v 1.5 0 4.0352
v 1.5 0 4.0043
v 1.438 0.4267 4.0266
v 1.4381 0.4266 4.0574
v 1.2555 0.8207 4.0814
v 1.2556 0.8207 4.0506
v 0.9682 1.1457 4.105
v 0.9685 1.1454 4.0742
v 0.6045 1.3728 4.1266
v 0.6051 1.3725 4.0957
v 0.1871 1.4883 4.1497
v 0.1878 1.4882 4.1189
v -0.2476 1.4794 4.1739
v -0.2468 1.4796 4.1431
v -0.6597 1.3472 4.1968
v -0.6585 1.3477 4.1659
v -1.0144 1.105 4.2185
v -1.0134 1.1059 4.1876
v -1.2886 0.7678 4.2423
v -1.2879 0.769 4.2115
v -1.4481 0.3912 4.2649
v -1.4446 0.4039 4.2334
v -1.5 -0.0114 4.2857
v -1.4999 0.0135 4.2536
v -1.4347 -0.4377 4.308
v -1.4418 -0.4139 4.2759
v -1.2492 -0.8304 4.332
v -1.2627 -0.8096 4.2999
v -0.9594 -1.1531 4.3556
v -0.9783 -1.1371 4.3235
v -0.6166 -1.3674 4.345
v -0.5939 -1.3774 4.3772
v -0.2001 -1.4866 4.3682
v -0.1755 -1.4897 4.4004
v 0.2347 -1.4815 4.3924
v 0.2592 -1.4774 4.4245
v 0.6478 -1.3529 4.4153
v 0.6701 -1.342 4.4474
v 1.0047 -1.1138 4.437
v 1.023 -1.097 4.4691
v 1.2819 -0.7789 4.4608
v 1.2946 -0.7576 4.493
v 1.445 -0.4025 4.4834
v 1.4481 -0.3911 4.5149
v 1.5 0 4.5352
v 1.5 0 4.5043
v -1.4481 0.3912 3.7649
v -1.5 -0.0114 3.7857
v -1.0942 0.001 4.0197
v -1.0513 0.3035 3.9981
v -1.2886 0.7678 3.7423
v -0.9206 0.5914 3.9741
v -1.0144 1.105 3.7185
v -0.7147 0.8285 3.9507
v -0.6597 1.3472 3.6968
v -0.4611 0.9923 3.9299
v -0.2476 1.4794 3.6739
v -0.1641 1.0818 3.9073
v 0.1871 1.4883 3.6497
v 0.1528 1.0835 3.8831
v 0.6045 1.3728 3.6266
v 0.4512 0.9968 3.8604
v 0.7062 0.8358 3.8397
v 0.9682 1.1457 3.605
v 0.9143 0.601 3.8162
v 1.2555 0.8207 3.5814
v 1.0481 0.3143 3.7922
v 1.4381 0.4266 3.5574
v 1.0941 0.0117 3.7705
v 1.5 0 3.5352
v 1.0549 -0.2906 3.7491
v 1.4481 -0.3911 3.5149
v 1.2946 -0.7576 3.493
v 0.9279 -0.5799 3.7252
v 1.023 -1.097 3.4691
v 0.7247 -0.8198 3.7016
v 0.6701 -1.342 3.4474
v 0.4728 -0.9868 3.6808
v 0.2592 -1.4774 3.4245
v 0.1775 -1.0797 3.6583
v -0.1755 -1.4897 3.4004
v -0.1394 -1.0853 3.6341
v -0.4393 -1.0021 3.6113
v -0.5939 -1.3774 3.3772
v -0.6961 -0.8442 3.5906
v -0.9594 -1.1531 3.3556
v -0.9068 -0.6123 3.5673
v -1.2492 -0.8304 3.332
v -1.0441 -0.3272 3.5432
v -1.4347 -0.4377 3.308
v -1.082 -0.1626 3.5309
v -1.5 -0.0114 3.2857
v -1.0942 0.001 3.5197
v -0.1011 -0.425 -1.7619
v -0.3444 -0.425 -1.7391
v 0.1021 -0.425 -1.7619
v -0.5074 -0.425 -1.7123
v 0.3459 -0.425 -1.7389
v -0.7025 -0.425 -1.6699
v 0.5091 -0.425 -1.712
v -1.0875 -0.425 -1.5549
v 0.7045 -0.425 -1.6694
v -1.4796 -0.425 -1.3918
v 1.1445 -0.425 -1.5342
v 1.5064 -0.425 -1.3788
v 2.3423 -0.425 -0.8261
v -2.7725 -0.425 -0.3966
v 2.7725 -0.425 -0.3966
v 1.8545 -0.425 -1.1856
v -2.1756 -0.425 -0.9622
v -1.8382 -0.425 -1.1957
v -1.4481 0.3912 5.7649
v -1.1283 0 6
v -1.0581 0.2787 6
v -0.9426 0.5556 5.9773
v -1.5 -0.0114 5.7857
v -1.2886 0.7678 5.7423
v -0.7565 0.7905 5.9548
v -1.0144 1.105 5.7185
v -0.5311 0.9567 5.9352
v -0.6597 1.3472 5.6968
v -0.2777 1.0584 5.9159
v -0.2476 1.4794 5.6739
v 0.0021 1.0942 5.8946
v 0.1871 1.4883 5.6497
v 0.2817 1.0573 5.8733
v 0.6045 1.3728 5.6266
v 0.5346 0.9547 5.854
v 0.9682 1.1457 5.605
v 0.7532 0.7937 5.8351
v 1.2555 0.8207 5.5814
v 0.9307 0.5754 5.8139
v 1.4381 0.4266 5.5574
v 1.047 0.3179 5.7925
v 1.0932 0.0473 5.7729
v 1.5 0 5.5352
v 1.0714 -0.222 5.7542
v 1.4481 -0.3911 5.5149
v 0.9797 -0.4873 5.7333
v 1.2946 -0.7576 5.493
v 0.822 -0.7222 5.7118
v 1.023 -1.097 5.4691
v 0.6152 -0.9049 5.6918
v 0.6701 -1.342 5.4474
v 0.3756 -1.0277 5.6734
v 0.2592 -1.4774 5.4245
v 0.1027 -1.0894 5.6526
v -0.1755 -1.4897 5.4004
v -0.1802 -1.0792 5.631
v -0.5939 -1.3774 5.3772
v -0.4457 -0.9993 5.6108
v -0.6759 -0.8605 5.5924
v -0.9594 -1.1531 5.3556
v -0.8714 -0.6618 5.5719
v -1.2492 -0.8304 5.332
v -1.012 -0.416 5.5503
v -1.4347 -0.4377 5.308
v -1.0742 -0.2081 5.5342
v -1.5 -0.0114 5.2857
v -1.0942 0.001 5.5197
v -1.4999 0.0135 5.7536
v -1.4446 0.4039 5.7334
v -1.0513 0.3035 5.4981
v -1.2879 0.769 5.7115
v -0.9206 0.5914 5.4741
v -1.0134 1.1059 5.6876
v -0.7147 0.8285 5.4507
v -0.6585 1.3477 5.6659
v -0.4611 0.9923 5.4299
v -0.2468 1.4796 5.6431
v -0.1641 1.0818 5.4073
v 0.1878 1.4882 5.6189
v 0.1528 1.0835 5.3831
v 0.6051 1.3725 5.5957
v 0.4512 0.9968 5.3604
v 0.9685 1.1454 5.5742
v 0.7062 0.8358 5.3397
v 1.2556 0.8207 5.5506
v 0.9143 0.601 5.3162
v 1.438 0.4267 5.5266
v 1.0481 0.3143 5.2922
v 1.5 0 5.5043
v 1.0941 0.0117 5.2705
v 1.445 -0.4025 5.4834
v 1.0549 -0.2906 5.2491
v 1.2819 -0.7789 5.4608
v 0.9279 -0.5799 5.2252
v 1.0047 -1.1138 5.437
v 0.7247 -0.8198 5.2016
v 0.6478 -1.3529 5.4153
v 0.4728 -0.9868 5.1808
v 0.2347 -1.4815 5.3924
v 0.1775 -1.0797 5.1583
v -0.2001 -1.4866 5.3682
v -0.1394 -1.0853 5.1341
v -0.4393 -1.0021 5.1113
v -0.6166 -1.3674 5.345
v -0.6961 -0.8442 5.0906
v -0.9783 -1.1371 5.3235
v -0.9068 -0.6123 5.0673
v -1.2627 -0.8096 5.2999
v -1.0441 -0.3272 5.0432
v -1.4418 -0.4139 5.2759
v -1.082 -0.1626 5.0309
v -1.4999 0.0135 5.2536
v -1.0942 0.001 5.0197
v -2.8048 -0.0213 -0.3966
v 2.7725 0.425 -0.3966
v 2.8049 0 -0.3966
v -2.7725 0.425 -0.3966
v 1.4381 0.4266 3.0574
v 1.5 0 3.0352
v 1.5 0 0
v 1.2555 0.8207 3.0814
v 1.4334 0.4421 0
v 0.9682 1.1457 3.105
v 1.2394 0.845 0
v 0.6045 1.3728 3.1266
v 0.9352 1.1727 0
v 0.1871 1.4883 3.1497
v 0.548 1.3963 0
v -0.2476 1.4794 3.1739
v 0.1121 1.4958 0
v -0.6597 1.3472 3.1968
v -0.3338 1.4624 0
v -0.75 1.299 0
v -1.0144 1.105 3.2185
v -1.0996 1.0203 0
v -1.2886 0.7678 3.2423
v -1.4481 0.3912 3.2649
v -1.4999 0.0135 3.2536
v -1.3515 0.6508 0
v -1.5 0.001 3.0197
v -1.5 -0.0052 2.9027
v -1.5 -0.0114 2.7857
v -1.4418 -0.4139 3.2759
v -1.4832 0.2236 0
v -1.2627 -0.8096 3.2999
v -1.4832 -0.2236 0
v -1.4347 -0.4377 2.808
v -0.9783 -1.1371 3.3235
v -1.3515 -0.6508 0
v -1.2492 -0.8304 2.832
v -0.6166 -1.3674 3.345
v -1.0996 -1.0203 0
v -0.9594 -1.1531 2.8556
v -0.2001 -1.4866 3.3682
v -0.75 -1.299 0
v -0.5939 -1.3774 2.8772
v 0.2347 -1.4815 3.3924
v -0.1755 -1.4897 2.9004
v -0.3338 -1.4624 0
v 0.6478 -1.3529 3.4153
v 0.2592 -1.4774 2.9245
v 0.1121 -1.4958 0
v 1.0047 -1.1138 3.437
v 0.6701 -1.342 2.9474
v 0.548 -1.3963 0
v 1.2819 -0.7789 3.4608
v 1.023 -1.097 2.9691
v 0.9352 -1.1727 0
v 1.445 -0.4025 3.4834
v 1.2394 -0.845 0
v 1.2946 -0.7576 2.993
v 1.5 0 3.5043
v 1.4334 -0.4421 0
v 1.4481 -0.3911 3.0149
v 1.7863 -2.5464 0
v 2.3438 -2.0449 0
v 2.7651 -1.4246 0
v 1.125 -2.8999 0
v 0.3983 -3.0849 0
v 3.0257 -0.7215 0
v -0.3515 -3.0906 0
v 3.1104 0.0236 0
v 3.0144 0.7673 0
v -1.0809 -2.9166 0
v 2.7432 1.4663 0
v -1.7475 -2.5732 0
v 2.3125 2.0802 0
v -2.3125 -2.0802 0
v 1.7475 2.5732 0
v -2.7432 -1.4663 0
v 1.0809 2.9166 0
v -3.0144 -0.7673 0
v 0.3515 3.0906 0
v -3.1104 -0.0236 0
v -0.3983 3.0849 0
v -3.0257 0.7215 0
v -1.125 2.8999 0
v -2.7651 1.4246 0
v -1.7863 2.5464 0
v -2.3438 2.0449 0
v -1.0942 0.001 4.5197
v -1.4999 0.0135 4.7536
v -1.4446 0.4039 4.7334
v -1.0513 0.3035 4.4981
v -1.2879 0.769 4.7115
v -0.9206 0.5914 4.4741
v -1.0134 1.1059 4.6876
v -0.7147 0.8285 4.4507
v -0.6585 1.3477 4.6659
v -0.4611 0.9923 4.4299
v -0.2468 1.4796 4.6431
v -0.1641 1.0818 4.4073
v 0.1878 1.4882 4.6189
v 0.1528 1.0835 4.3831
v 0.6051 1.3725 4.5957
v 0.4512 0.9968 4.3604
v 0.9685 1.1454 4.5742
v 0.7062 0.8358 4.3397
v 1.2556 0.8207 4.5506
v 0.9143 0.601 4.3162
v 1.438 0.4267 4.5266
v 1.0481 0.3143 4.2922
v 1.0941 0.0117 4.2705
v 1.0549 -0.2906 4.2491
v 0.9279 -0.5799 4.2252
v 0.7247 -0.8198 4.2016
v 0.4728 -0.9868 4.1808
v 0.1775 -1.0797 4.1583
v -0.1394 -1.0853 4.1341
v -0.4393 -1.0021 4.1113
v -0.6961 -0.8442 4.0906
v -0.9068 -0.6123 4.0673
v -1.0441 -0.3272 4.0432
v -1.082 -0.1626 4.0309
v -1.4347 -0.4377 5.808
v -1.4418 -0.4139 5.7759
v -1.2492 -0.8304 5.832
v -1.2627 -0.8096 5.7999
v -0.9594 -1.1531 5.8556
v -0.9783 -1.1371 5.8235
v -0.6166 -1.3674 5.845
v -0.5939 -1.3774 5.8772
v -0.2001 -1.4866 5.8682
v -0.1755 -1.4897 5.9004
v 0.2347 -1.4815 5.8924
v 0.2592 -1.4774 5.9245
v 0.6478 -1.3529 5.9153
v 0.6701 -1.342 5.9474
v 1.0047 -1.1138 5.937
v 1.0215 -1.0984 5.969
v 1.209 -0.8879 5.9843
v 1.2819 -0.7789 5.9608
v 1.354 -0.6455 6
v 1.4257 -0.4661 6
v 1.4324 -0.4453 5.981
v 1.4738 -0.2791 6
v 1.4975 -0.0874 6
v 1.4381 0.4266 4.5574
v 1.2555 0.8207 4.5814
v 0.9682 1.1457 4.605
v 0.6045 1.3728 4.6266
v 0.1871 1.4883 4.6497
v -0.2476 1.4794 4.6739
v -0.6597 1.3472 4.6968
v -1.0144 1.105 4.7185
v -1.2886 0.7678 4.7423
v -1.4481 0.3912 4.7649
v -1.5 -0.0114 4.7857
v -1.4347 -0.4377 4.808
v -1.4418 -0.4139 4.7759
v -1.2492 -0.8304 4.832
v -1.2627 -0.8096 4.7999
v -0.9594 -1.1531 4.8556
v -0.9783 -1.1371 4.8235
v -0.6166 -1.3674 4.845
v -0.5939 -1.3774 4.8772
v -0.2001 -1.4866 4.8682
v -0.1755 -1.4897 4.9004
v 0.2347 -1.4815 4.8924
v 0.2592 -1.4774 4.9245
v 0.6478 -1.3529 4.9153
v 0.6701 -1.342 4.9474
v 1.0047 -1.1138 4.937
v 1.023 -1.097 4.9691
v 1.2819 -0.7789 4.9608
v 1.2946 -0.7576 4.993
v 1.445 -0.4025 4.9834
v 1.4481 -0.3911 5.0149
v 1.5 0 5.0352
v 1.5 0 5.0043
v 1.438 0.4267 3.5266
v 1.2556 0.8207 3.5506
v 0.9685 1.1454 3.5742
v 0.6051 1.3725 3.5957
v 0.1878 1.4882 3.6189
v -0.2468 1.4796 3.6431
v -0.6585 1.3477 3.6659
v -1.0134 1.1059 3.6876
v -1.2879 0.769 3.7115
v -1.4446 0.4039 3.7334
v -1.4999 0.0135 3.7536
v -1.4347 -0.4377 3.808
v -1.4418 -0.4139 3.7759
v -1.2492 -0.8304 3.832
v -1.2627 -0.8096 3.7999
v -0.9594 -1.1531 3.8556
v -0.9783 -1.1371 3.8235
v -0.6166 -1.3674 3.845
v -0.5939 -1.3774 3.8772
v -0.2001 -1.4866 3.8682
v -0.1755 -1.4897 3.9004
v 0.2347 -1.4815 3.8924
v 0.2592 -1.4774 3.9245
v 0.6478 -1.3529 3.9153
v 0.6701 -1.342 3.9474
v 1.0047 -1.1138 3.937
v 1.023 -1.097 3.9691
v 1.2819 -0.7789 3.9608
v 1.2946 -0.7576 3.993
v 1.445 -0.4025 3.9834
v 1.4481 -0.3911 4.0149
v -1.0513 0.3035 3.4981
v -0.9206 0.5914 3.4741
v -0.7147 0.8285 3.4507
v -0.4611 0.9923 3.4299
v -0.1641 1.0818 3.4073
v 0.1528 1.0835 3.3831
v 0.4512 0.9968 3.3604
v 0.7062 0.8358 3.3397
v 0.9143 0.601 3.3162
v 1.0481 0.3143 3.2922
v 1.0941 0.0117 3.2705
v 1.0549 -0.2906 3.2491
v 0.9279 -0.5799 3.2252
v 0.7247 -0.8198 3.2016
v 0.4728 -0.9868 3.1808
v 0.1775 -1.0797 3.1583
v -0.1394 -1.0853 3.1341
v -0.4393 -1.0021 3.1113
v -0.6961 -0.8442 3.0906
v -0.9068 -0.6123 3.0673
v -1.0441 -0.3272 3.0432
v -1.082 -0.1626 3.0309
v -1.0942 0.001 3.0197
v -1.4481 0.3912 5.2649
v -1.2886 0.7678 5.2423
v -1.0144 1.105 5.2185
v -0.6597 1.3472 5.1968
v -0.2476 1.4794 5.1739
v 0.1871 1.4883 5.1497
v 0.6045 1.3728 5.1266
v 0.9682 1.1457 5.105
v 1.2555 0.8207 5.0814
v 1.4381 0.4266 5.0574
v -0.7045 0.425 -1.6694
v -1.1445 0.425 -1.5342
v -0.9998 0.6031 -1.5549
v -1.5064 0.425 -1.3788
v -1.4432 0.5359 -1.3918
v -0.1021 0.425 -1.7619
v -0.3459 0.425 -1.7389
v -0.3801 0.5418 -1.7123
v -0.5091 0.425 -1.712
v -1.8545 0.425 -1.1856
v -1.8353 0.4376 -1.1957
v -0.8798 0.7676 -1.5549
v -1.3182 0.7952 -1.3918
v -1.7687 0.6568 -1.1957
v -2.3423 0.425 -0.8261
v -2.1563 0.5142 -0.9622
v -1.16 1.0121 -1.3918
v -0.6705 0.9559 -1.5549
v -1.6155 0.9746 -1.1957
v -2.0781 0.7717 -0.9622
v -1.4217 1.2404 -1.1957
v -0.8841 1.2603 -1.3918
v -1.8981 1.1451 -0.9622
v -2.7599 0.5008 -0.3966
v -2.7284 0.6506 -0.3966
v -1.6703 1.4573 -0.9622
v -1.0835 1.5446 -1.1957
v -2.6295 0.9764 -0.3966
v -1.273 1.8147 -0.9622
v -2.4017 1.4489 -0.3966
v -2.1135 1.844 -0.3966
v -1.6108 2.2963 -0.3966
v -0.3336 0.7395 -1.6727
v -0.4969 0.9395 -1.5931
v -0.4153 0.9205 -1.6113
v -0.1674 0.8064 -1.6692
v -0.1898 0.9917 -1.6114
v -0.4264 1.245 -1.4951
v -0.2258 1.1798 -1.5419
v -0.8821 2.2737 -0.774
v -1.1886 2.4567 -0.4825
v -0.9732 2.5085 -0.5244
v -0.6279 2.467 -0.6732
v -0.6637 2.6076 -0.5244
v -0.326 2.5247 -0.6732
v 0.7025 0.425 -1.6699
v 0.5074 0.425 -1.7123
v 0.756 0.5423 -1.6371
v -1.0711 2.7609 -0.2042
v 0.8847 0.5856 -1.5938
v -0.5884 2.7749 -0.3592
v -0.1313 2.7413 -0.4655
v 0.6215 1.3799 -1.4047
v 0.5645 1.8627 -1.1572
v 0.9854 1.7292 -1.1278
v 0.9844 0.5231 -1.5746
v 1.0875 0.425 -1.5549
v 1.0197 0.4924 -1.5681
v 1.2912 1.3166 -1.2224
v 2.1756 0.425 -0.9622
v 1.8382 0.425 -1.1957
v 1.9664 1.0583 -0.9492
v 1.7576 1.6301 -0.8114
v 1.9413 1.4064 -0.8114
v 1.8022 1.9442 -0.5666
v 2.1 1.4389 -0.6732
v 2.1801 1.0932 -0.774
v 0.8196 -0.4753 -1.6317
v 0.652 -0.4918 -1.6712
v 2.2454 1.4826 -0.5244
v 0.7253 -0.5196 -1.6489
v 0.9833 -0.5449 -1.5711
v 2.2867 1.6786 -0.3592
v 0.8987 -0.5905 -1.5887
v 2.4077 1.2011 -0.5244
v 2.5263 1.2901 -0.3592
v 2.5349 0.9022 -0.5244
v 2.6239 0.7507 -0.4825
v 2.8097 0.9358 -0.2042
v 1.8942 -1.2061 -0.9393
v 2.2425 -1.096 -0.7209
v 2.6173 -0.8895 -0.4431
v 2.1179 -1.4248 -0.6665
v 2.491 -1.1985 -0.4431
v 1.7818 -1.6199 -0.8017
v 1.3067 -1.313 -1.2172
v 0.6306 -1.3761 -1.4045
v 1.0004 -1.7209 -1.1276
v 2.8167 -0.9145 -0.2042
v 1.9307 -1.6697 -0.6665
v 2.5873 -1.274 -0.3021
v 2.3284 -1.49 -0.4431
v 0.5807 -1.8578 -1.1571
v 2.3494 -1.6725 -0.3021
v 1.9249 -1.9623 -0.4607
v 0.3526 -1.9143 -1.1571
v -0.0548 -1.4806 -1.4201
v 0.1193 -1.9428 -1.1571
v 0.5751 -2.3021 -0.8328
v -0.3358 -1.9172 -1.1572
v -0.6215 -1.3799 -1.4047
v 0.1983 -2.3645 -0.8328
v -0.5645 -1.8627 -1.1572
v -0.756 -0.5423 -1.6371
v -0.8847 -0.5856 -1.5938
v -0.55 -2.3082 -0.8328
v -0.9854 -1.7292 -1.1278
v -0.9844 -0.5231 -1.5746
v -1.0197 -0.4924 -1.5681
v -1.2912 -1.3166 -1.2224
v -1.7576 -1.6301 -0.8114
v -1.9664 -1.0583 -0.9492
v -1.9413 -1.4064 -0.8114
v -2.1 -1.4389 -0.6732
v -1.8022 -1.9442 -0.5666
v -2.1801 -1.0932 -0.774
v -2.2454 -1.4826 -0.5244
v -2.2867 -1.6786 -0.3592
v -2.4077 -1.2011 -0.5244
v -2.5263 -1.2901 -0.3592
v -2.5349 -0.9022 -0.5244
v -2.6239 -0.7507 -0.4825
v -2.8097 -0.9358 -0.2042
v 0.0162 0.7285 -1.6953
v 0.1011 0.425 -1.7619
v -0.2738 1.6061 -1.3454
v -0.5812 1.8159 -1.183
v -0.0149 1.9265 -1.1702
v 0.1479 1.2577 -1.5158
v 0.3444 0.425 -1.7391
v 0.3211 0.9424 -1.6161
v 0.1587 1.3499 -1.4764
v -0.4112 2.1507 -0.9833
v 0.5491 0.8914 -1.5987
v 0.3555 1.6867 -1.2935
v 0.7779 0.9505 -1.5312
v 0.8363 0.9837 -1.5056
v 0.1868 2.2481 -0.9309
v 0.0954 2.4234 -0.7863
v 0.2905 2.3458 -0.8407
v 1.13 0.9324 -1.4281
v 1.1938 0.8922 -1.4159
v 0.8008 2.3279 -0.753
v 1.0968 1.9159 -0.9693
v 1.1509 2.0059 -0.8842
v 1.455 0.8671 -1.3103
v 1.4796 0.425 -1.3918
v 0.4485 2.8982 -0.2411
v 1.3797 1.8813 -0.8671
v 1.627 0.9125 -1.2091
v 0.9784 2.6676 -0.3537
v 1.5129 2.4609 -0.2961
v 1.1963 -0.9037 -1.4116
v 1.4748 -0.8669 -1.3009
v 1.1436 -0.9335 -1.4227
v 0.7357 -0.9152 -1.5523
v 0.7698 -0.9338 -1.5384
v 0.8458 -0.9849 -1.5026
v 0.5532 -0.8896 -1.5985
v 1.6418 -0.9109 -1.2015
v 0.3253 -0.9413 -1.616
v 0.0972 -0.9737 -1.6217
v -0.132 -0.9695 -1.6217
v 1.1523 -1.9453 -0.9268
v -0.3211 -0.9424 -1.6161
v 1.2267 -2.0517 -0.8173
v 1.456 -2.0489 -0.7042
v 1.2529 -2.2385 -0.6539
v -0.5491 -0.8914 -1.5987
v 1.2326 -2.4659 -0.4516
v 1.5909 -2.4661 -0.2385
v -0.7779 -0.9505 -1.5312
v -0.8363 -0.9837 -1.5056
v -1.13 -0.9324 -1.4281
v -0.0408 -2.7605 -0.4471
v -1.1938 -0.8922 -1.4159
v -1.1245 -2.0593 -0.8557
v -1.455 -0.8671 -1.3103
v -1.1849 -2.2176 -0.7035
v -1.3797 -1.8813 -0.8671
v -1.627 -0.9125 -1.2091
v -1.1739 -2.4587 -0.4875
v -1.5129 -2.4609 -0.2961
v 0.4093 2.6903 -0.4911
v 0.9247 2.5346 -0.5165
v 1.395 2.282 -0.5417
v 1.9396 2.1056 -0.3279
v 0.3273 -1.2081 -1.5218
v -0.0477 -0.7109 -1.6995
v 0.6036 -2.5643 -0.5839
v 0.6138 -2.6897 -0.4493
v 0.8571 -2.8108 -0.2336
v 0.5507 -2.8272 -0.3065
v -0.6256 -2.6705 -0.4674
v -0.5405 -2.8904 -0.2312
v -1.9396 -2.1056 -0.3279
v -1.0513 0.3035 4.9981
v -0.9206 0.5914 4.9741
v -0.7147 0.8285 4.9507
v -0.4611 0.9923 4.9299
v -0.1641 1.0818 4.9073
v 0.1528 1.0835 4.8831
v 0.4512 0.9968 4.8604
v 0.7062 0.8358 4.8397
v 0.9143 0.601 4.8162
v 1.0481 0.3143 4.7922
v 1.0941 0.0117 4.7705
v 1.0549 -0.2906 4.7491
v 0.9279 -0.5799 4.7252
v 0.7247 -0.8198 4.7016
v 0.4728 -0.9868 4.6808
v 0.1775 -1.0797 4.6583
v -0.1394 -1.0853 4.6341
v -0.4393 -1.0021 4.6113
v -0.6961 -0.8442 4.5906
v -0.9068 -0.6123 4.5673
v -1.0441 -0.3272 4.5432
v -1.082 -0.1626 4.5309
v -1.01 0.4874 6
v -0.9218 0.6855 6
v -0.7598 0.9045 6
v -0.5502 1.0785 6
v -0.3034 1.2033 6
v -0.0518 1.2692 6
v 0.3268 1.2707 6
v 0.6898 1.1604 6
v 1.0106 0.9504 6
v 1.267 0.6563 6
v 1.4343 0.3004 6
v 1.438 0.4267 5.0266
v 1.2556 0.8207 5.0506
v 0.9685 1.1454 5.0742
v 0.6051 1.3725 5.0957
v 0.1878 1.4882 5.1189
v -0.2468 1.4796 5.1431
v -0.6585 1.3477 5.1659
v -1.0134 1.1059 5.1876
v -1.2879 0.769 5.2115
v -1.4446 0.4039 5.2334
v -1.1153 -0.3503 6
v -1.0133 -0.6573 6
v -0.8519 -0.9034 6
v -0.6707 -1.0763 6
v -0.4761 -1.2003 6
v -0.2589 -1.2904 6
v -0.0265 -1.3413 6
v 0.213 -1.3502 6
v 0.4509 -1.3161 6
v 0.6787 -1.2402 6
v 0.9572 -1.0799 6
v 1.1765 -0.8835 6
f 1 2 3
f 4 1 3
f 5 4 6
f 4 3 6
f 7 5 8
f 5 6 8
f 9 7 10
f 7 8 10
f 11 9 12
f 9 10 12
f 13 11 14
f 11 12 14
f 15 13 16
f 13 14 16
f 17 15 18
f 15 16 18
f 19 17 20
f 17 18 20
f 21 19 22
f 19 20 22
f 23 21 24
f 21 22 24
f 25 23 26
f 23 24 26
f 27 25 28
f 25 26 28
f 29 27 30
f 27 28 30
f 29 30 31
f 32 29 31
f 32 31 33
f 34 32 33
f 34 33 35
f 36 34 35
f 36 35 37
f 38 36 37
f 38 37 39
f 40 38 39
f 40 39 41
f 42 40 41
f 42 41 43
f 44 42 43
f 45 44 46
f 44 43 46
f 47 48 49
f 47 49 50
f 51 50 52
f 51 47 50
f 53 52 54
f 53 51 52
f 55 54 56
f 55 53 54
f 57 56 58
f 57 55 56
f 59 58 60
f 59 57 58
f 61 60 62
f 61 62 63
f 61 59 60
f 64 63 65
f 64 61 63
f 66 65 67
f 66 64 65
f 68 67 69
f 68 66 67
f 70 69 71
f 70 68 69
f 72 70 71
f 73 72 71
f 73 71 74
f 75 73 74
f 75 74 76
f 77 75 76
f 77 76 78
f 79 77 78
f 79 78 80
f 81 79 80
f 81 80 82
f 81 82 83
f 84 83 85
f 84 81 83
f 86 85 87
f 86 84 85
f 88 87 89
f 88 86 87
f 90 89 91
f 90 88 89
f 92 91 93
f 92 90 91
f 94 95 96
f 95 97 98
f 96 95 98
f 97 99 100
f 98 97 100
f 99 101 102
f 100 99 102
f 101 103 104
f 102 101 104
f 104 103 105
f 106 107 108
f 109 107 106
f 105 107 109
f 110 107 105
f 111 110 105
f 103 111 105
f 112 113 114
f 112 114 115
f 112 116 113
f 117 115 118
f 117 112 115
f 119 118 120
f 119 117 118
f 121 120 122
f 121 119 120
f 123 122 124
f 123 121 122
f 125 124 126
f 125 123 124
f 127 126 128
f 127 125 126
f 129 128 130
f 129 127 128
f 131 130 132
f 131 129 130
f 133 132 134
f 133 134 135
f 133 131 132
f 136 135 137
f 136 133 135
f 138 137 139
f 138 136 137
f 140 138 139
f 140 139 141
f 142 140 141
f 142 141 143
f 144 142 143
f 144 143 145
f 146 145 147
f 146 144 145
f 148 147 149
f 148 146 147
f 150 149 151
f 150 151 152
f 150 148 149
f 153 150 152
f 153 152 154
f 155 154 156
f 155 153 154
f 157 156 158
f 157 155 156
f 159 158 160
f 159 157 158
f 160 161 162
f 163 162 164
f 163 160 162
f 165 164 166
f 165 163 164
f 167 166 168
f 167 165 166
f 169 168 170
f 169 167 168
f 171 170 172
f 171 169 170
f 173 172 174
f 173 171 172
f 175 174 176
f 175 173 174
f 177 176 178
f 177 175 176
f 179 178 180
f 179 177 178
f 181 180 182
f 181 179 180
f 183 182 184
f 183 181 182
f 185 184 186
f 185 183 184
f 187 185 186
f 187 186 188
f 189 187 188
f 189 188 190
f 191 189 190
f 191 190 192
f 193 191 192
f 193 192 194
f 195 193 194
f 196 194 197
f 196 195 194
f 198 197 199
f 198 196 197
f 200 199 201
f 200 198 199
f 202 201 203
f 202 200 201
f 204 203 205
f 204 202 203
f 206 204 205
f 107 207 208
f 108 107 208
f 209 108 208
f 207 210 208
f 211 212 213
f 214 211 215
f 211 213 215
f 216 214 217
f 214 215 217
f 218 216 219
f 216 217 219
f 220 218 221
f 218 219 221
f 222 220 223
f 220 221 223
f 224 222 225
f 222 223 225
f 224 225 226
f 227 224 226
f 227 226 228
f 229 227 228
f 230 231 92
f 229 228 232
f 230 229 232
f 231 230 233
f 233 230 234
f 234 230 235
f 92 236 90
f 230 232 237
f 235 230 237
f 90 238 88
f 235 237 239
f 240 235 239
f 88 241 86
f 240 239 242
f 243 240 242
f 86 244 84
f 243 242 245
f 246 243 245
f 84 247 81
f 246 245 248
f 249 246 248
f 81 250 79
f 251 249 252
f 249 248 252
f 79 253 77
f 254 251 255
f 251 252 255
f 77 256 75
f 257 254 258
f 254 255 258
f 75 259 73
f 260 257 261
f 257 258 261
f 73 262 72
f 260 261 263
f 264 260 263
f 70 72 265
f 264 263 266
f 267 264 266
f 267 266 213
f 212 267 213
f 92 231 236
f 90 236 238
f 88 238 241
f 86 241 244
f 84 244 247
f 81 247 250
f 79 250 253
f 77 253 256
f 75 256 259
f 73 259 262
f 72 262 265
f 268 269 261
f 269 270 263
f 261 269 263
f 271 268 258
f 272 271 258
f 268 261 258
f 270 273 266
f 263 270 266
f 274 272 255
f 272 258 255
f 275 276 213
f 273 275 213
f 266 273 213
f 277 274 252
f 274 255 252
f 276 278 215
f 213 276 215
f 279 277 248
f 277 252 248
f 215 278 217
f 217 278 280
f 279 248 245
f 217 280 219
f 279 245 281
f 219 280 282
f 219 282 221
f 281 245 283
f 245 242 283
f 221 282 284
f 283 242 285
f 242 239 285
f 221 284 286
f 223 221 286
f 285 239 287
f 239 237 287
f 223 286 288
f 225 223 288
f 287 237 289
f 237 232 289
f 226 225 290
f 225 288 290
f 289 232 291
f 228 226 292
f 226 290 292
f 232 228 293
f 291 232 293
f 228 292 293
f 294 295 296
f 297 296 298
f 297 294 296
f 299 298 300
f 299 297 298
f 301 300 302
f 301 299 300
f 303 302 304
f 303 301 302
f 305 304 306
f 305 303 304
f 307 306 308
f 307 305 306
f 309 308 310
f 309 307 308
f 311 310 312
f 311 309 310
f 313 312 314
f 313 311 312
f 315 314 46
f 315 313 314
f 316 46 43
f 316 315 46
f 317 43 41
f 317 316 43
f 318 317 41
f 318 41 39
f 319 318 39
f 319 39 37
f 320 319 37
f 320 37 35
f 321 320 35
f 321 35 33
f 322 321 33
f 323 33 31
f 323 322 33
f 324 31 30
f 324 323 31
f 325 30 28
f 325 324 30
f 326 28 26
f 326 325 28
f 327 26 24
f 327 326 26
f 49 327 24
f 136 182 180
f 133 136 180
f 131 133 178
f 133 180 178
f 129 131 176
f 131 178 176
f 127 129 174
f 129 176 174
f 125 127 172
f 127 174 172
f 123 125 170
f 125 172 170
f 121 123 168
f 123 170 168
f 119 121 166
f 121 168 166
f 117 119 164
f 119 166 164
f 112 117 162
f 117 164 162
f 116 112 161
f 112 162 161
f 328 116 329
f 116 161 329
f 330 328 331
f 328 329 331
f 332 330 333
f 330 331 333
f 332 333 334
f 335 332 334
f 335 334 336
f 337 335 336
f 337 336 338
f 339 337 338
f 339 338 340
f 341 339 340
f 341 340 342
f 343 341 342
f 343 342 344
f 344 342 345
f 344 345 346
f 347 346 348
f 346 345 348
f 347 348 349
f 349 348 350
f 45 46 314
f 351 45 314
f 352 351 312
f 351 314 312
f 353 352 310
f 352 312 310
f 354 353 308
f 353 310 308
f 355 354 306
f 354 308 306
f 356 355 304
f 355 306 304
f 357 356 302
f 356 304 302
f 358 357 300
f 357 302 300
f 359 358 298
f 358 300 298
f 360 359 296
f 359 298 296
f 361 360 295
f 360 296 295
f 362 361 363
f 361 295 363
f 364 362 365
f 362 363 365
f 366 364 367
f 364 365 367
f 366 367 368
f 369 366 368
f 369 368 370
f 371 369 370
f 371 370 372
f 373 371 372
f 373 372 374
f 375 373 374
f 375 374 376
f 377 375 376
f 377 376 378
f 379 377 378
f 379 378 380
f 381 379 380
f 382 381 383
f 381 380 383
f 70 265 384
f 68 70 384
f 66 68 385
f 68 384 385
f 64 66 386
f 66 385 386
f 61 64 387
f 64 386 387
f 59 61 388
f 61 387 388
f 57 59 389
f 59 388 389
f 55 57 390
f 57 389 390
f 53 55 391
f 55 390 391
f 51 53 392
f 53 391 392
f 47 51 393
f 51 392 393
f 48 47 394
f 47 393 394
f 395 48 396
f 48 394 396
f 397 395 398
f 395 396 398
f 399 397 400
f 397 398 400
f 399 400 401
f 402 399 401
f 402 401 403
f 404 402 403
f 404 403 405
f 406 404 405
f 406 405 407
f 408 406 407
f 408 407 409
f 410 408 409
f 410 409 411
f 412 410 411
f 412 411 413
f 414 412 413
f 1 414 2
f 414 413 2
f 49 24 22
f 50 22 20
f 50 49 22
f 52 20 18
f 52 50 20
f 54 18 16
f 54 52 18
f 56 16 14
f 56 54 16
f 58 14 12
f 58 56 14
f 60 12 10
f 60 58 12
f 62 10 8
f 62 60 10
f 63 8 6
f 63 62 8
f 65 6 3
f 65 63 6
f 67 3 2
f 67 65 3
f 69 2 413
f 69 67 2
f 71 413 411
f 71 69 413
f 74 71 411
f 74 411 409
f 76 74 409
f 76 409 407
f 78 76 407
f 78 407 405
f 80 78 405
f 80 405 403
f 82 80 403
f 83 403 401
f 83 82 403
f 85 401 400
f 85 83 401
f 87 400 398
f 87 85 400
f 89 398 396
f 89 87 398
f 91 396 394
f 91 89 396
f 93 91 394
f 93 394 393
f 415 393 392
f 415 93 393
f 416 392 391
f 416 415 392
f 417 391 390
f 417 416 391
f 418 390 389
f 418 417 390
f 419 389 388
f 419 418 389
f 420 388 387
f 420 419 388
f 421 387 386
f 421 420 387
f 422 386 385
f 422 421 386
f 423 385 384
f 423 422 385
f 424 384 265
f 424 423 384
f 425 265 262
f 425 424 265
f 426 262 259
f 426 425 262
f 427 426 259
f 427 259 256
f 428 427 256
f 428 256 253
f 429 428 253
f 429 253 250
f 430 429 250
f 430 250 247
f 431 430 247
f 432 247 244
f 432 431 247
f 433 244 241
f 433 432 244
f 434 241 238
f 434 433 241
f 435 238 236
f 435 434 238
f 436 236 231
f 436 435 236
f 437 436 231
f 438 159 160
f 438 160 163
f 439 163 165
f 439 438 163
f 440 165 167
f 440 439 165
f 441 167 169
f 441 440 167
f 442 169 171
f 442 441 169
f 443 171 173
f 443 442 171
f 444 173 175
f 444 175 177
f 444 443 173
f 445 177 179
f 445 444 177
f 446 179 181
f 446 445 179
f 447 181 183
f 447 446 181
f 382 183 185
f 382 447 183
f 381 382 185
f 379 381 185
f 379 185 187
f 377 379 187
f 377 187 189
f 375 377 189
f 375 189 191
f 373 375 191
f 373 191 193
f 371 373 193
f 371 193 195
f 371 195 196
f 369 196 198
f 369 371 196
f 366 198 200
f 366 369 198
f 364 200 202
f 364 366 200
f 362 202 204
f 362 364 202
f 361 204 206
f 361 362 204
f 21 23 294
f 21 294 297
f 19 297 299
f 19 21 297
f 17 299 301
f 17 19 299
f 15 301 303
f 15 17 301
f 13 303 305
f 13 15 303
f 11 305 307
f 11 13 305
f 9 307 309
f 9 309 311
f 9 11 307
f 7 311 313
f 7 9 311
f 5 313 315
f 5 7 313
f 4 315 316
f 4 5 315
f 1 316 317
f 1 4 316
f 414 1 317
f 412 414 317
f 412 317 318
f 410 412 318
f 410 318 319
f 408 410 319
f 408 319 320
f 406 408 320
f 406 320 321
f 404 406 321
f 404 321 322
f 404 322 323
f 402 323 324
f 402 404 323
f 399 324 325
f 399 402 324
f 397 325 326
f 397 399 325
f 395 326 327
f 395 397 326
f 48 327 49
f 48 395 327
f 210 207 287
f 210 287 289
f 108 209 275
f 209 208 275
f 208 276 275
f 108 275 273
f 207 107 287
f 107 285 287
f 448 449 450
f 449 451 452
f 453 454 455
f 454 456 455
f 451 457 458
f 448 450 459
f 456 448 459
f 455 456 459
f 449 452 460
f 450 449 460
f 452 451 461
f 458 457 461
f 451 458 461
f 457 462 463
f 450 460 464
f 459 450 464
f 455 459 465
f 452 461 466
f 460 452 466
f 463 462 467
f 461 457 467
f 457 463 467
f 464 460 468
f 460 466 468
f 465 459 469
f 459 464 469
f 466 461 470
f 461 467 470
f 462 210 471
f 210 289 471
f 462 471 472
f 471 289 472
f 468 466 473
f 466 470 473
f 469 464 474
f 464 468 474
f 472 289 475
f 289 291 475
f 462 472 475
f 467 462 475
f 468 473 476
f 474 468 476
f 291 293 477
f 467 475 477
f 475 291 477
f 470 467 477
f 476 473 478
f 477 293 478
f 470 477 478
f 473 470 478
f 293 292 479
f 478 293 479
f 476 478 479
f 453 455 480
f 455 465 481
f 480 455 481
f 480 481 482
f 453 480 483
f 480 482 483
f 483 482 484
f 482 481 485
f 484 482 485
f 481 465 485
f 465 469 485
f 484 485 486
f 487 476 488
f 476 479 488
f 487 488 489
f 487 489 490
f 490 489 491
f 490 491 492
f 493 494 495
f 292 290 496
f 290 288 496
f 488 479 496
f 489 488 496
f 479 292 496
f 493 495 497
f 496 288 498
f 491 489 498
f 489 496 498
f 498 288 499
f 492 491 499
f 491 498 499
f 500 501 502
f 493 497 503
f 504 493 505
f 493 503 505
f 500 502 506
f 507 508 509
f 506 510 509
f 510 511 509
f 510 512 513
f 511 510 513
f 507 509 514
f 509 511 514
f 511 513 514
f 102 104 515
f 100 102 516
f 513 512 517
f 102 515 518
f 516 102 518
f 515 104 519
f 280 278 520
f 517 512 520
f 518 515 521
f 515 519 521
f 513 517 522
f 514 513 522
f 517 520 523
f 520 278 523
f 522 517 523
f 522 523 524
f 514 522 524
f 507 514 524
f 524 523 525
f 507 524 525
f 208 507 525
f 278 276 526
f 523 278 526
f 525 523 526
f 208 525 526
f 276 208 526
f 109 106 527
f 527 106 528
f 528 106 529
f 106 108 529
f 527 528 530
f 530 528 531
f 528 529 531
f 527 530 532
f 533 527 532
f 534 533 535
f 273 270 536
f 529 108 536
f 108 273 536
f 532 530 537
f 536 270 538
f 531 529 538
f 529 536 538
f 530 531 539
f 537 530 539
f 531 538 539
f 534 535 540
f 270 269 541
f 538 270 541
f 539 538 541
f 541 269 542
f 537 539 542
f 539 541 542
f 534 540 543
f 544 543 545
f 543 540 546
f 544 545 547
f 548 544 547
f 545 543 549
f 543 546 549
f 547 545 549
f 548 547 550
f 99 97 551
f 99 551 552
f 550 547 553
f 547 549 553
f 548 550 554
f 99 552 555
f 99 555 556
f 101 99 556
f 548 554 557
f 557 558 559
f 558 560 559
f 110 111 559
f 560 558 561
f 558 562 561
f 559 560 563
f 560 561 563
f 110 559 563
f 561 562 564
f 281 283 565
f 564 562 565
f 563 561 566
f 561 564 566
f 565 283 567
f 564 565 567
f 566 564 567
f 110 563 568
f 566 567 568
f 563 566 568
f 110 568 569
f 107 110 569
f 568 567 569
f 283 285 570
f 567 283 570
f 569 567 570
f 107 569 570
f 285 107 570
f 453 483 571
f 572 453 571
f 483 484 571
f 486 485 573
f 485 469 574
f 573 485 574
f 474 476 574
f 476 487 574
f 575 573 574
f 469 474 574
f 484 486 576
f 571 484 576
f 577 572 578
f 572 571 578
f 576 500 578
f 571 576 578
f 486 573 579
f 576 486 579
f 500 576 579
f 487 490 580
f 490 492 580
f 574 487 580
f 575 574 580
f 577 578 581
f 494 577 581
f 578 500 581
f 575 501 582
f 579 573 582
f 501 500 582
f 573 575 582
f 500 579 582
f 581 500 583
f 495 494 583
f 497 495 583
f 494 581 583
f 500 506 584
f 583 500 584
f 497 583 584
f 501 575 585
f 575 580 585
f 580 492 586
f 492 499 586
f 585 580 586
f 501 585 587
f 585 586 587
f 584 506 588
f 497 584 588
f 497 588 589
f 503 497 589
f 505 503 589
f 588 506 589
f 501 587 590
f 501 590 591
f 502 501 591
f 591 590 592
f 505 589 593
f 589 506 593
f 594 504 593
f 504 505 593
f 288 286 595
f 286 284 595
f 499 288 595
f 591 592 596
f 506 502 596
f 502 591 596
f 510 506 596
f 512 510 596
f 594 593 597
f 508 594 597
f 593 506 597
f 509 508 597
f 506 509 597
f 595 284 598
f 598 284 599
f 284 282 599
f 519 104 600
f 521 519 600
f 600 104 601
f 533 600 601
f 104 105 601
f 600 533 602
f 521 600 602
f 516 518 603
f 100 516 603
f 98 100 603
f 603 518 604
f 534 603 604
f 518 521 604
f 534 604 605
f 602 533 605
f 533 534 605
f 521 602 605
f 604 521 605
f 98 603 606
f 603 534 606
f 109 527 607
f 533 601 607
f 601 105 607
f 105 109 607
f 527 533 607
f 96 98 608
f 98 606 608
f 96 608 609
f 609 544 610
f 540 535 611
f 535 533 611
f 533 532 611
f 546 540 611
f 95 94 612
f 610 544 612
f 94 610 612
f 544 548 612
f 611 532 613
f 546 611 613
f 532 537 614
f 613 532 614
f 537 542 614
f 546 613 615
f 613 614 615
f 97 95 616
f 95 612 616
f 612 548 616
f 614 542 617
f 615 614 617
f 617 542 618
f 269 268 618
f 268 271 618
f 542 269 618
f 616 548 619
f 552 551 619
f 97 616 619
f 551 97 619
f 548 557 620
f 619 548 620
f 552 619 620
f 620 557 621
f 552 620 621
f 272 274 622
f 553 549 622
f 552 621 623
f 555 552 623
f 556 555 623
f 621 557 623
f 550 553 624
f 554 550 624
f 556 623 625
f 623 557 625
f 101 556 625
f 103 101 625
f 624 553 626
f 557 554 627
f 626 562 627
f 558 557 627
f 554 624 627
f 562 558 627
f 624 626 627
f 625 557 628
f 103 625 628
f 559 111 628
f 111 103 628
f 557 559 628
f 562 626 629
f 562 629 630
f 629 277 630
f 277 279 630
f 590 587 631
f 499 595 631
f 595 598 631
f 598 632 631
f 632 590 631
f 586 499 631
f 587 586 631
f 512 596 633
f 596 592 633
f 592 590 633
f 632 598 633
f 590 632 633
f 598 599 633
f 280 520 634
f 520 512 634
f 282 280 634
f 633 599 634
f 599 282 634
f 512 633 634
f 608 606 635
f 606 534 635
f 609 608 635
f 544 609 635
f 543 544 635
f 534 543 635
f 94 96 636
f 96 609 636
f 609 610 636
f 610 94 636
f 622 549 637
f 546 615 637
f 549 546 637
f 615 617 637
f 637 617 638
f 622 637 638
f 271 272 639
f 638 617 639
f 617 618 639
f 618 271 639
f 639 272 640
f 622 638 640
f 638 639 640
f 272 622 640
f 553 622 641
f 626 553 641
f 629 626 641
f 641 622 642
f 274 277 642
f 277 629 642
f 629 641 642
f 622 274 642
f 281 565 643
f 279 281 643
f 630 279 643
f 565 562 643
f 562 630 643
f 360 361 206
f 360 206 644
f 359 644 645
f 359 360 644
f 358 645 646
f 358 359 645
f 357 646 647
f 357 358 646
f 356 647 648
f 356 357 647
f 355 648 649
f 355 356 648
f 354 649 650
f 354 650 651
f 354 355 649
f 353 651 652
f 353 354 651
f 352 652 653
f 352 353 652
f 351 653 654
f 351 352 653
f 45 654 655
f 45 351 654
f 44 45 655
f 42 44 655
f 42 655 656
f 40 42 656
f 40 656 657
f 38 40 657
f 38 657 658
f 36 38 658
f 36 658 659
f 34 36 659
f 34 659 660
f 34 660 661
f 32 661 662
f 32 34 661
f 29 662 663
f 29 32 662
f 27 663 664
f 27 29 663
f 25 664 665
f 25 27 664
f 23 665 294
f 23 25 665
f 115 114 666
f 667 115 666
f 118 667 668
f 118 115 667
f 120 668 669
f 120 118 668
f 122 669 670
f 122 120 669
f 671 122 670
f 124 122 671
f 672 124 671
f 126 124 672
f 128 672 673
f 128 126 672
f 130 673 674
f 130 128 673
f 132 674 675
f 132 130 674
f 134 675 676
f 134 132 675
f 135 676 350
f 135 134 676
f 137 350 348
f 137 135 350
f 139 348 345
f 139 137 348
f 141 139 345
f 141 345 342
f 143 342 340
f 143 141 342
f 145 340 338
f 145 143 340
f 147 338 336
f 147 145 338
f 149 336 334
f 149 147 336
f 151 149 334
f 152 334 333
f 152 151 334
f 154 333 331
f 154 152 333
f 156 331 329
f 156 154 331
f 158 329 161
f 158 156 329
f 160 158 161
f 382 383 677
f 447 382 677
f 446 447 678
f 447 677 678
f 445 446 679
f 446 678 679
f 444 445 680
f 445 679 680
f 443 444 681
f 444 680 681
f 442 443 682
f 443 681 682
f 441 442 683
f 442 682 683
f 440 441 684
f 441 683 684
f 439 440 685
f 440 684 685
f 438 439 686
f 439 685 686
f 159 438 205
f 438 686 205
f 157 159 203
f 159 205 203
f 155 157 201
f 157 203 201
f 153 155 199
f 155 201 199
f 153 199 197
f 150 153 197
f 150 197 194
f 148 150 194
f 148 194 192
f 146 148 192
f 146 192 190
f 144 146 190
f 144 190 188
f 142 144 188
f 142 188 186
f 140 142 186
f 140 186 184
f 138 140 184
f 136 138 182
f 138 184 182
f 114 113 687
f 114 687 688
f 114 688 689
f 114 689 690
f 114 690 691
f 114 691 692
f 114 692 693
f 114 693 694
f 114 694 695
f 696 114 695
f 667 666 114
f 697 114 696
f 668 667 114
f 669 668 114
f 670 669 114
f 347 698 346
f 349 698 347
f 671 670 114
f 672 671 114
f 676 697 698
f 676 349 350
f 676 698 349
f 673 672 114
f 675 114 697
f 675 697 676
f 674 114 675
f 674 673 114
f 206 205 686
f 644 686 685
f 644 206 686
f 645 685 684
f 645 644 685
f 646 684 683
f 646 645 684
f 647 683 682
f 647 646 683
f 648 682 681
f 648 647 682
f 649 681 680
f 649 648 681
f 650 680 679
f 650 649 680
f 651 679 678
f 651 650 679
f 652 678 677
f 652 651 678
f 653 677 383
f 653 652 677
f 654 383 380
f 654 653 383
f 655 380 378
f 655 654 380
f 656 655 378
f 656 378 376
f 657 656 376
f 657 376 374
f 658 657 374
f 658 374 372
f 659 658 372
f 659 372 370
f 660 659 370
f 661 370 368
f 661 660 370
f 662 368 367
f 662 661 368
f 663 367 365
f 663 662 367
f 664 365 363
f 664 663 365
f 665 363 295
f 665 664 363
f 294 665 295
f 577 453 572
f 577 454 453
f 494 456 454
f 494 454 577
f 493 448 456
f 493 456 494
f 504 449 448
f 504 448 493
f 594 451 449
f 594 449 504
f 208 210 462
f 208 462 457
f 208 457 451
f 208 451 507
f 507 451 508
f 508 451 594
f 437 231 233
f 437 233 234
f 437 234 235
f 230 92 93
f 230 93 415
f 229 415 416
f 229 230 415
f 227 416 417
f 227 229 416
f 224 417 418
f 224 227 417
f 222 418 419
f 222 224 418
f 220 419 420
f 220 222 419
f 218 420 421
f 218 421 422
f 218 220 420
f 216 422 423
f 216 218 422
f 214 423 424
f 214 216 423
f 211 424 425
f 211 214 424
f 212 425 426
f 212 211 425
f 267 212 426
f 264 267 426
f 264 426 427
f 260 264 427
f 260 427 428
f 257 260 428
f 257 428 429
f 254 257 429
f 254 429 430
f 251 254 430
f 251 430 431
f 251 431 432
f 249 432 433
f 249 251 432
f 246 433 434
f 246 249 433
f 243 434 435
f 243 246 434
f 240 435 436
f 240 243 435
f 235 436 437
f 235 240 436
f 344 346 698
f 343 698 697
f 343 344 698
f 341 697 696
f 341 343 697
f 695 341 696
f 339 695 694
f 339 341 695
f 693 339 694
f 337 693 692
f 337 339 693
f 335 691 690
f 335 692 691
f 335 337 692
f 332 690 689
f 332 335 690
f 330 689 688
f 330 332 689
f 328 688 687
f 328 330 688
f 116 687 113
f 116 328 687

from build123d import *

# Parameters (mm, degrees)
SKETCH1_R           = 1.5
BOSS_EXTRUDE1_DEPTH = 6
CUT_SWEEP1_PITCH    = 0.5
SKETCH5_W           = 11.492043773
SKETCH5_H           = 0.85
CUT_EXTRUDE1_DEPTH  = 2


with BuildPart() as part:
    # Sketch1 → Boss-Extrude1 (new body)
    with BuildSketch(Plane.XY):
        Circle(SKETCH1_R)
    extrude(amount=BOSS_EXTRUDE1_DEPTH)

    # Cut-Sweep1: arcs per turn and ends read off the stored shape
    # Cut-Sweep1: the profile of Sketch3 screwed along a right-hand helix through 7 turns, 6 arcs to a turn; built about Z, then put on its axis
    cut_sweep1_z = Axis((0, 0, 0), (0, 0, 1))
    cut_sweep1_corners = [(1.094191853, 0.001044043, -0.519679739), (1.509884047, -0.011670473, -0.280016765), (1.509884047, 0.013758558, -0.759342713)]
    with BuildLine(mode=Mode.PRIVATE) as cut_sweep1_profile:
        Line(cut_sweep1_corners[0], cut_sweep1_corners[1])
        Line(cut_sweep1_corners[1], cut_sweep1_corners[2])
        Line(cut_sweep1_corners[2], cut_sweep1_corners[0])
    cut_sweep1_cap = Face(cut_sweep1_profile.wire())
    cut_sweep1_turn_angles = [0, 30, 60, 90, 120, 150, 180, 210, 240, 270, 300, 330, 360]
    cut_sweep1_turn_weights = [1, 0.8660254037844387, 1, 0.8660254037844387, 1, 0.8660254037844387, 1, 0.8660254037844387, 1, 0.8660254037844387, 1, 0.8660254037844387, 1]
    cut_sweep1_turn_rails = [Edge.make_bspline([Vector(p[0], p[1], 0).rotate(cut_sweep1_z, cut_sweep1_turn_angles[k]) / cut_sweep1_turn_weights[k] + Vector(0, 0, p[2] + CUT_SWEEP1_PITCH * cut_sweep1_turn_angles[k] / 360) for k in range(13)], [0, 0, 0, 1, 1, 2, 2, 3, 3, 4, 4, 5, 5, 6, 6, 6], 2, cut_sweep1_turn_weights) for p in cut_sweep1_corners]
    cut_sweep1_turn_sides = [Face.make_surface_from_curves(cut_sweep1_turn_rails[p[0]], cut_sweep1_turn_rails[p[1]]) for p in [(0, 1), (1, 2), (2, 0)]]
    cut_sweep1 = Plane(origin=(0, 0, 6), x_dir=(-1, 0, 0), z_dir=(0, 0, -1)) * Solid(Shell([*[p.moved(Location((0, 0, CUT_SWEEP1_PITCH * i))) for i in range(7) for p in cut_sweep1_turn_sides], cut_sweep1_cap, cut_sweep1_cap.rotate(cut_sweep1_z, 2520).moved(Location((0, 0, CUT_SWEEP1_PITCH * 2520 / 360)))]))
    add(cut_sweep1, mode=Mode.SUBTRACT)

    # Sketch4 → Revolve1 (revolve)
    with BuildSketch(Plane(origin=(0, 0, 0), x_dir=(0, 0, -1), z_dir=(1, 0, 0)), mode=Mode.PRIVATE) as revolve1_sk:
        with BuildLine():
            Line((0, -3.110484298), (0, 0))
            Line((0, 0), (1.827405733, 0))
            add(Edge.make_bspline(
                [(1.827405733, 0), (1.614806924, -1.993581121), (0, -3.110484298)],
                knots=[0, 0, 0, 1, 1, 1], degree=2))
        make_face()
    revolve(revolve1_sk.sketch.rotate(Axis((0, 0, 0), (0, 0, -1)), 89.565814591), axis=Axis((0, 0, 0), (0, 0, -1)))

    # Sketch5 → Cut-Extrude1 (cut)
    with BuildSketch(Plane.XY.offset(-0.396562646)):
        with Locations((0.364356631, 0)):
            Rectangle(SKETCH5_W, SKETCH5_H)
    extrude(amount=-CUT_EXTRUDE1_DEPTH, mode=Mode.SUBTRACT)


solid = part.part
